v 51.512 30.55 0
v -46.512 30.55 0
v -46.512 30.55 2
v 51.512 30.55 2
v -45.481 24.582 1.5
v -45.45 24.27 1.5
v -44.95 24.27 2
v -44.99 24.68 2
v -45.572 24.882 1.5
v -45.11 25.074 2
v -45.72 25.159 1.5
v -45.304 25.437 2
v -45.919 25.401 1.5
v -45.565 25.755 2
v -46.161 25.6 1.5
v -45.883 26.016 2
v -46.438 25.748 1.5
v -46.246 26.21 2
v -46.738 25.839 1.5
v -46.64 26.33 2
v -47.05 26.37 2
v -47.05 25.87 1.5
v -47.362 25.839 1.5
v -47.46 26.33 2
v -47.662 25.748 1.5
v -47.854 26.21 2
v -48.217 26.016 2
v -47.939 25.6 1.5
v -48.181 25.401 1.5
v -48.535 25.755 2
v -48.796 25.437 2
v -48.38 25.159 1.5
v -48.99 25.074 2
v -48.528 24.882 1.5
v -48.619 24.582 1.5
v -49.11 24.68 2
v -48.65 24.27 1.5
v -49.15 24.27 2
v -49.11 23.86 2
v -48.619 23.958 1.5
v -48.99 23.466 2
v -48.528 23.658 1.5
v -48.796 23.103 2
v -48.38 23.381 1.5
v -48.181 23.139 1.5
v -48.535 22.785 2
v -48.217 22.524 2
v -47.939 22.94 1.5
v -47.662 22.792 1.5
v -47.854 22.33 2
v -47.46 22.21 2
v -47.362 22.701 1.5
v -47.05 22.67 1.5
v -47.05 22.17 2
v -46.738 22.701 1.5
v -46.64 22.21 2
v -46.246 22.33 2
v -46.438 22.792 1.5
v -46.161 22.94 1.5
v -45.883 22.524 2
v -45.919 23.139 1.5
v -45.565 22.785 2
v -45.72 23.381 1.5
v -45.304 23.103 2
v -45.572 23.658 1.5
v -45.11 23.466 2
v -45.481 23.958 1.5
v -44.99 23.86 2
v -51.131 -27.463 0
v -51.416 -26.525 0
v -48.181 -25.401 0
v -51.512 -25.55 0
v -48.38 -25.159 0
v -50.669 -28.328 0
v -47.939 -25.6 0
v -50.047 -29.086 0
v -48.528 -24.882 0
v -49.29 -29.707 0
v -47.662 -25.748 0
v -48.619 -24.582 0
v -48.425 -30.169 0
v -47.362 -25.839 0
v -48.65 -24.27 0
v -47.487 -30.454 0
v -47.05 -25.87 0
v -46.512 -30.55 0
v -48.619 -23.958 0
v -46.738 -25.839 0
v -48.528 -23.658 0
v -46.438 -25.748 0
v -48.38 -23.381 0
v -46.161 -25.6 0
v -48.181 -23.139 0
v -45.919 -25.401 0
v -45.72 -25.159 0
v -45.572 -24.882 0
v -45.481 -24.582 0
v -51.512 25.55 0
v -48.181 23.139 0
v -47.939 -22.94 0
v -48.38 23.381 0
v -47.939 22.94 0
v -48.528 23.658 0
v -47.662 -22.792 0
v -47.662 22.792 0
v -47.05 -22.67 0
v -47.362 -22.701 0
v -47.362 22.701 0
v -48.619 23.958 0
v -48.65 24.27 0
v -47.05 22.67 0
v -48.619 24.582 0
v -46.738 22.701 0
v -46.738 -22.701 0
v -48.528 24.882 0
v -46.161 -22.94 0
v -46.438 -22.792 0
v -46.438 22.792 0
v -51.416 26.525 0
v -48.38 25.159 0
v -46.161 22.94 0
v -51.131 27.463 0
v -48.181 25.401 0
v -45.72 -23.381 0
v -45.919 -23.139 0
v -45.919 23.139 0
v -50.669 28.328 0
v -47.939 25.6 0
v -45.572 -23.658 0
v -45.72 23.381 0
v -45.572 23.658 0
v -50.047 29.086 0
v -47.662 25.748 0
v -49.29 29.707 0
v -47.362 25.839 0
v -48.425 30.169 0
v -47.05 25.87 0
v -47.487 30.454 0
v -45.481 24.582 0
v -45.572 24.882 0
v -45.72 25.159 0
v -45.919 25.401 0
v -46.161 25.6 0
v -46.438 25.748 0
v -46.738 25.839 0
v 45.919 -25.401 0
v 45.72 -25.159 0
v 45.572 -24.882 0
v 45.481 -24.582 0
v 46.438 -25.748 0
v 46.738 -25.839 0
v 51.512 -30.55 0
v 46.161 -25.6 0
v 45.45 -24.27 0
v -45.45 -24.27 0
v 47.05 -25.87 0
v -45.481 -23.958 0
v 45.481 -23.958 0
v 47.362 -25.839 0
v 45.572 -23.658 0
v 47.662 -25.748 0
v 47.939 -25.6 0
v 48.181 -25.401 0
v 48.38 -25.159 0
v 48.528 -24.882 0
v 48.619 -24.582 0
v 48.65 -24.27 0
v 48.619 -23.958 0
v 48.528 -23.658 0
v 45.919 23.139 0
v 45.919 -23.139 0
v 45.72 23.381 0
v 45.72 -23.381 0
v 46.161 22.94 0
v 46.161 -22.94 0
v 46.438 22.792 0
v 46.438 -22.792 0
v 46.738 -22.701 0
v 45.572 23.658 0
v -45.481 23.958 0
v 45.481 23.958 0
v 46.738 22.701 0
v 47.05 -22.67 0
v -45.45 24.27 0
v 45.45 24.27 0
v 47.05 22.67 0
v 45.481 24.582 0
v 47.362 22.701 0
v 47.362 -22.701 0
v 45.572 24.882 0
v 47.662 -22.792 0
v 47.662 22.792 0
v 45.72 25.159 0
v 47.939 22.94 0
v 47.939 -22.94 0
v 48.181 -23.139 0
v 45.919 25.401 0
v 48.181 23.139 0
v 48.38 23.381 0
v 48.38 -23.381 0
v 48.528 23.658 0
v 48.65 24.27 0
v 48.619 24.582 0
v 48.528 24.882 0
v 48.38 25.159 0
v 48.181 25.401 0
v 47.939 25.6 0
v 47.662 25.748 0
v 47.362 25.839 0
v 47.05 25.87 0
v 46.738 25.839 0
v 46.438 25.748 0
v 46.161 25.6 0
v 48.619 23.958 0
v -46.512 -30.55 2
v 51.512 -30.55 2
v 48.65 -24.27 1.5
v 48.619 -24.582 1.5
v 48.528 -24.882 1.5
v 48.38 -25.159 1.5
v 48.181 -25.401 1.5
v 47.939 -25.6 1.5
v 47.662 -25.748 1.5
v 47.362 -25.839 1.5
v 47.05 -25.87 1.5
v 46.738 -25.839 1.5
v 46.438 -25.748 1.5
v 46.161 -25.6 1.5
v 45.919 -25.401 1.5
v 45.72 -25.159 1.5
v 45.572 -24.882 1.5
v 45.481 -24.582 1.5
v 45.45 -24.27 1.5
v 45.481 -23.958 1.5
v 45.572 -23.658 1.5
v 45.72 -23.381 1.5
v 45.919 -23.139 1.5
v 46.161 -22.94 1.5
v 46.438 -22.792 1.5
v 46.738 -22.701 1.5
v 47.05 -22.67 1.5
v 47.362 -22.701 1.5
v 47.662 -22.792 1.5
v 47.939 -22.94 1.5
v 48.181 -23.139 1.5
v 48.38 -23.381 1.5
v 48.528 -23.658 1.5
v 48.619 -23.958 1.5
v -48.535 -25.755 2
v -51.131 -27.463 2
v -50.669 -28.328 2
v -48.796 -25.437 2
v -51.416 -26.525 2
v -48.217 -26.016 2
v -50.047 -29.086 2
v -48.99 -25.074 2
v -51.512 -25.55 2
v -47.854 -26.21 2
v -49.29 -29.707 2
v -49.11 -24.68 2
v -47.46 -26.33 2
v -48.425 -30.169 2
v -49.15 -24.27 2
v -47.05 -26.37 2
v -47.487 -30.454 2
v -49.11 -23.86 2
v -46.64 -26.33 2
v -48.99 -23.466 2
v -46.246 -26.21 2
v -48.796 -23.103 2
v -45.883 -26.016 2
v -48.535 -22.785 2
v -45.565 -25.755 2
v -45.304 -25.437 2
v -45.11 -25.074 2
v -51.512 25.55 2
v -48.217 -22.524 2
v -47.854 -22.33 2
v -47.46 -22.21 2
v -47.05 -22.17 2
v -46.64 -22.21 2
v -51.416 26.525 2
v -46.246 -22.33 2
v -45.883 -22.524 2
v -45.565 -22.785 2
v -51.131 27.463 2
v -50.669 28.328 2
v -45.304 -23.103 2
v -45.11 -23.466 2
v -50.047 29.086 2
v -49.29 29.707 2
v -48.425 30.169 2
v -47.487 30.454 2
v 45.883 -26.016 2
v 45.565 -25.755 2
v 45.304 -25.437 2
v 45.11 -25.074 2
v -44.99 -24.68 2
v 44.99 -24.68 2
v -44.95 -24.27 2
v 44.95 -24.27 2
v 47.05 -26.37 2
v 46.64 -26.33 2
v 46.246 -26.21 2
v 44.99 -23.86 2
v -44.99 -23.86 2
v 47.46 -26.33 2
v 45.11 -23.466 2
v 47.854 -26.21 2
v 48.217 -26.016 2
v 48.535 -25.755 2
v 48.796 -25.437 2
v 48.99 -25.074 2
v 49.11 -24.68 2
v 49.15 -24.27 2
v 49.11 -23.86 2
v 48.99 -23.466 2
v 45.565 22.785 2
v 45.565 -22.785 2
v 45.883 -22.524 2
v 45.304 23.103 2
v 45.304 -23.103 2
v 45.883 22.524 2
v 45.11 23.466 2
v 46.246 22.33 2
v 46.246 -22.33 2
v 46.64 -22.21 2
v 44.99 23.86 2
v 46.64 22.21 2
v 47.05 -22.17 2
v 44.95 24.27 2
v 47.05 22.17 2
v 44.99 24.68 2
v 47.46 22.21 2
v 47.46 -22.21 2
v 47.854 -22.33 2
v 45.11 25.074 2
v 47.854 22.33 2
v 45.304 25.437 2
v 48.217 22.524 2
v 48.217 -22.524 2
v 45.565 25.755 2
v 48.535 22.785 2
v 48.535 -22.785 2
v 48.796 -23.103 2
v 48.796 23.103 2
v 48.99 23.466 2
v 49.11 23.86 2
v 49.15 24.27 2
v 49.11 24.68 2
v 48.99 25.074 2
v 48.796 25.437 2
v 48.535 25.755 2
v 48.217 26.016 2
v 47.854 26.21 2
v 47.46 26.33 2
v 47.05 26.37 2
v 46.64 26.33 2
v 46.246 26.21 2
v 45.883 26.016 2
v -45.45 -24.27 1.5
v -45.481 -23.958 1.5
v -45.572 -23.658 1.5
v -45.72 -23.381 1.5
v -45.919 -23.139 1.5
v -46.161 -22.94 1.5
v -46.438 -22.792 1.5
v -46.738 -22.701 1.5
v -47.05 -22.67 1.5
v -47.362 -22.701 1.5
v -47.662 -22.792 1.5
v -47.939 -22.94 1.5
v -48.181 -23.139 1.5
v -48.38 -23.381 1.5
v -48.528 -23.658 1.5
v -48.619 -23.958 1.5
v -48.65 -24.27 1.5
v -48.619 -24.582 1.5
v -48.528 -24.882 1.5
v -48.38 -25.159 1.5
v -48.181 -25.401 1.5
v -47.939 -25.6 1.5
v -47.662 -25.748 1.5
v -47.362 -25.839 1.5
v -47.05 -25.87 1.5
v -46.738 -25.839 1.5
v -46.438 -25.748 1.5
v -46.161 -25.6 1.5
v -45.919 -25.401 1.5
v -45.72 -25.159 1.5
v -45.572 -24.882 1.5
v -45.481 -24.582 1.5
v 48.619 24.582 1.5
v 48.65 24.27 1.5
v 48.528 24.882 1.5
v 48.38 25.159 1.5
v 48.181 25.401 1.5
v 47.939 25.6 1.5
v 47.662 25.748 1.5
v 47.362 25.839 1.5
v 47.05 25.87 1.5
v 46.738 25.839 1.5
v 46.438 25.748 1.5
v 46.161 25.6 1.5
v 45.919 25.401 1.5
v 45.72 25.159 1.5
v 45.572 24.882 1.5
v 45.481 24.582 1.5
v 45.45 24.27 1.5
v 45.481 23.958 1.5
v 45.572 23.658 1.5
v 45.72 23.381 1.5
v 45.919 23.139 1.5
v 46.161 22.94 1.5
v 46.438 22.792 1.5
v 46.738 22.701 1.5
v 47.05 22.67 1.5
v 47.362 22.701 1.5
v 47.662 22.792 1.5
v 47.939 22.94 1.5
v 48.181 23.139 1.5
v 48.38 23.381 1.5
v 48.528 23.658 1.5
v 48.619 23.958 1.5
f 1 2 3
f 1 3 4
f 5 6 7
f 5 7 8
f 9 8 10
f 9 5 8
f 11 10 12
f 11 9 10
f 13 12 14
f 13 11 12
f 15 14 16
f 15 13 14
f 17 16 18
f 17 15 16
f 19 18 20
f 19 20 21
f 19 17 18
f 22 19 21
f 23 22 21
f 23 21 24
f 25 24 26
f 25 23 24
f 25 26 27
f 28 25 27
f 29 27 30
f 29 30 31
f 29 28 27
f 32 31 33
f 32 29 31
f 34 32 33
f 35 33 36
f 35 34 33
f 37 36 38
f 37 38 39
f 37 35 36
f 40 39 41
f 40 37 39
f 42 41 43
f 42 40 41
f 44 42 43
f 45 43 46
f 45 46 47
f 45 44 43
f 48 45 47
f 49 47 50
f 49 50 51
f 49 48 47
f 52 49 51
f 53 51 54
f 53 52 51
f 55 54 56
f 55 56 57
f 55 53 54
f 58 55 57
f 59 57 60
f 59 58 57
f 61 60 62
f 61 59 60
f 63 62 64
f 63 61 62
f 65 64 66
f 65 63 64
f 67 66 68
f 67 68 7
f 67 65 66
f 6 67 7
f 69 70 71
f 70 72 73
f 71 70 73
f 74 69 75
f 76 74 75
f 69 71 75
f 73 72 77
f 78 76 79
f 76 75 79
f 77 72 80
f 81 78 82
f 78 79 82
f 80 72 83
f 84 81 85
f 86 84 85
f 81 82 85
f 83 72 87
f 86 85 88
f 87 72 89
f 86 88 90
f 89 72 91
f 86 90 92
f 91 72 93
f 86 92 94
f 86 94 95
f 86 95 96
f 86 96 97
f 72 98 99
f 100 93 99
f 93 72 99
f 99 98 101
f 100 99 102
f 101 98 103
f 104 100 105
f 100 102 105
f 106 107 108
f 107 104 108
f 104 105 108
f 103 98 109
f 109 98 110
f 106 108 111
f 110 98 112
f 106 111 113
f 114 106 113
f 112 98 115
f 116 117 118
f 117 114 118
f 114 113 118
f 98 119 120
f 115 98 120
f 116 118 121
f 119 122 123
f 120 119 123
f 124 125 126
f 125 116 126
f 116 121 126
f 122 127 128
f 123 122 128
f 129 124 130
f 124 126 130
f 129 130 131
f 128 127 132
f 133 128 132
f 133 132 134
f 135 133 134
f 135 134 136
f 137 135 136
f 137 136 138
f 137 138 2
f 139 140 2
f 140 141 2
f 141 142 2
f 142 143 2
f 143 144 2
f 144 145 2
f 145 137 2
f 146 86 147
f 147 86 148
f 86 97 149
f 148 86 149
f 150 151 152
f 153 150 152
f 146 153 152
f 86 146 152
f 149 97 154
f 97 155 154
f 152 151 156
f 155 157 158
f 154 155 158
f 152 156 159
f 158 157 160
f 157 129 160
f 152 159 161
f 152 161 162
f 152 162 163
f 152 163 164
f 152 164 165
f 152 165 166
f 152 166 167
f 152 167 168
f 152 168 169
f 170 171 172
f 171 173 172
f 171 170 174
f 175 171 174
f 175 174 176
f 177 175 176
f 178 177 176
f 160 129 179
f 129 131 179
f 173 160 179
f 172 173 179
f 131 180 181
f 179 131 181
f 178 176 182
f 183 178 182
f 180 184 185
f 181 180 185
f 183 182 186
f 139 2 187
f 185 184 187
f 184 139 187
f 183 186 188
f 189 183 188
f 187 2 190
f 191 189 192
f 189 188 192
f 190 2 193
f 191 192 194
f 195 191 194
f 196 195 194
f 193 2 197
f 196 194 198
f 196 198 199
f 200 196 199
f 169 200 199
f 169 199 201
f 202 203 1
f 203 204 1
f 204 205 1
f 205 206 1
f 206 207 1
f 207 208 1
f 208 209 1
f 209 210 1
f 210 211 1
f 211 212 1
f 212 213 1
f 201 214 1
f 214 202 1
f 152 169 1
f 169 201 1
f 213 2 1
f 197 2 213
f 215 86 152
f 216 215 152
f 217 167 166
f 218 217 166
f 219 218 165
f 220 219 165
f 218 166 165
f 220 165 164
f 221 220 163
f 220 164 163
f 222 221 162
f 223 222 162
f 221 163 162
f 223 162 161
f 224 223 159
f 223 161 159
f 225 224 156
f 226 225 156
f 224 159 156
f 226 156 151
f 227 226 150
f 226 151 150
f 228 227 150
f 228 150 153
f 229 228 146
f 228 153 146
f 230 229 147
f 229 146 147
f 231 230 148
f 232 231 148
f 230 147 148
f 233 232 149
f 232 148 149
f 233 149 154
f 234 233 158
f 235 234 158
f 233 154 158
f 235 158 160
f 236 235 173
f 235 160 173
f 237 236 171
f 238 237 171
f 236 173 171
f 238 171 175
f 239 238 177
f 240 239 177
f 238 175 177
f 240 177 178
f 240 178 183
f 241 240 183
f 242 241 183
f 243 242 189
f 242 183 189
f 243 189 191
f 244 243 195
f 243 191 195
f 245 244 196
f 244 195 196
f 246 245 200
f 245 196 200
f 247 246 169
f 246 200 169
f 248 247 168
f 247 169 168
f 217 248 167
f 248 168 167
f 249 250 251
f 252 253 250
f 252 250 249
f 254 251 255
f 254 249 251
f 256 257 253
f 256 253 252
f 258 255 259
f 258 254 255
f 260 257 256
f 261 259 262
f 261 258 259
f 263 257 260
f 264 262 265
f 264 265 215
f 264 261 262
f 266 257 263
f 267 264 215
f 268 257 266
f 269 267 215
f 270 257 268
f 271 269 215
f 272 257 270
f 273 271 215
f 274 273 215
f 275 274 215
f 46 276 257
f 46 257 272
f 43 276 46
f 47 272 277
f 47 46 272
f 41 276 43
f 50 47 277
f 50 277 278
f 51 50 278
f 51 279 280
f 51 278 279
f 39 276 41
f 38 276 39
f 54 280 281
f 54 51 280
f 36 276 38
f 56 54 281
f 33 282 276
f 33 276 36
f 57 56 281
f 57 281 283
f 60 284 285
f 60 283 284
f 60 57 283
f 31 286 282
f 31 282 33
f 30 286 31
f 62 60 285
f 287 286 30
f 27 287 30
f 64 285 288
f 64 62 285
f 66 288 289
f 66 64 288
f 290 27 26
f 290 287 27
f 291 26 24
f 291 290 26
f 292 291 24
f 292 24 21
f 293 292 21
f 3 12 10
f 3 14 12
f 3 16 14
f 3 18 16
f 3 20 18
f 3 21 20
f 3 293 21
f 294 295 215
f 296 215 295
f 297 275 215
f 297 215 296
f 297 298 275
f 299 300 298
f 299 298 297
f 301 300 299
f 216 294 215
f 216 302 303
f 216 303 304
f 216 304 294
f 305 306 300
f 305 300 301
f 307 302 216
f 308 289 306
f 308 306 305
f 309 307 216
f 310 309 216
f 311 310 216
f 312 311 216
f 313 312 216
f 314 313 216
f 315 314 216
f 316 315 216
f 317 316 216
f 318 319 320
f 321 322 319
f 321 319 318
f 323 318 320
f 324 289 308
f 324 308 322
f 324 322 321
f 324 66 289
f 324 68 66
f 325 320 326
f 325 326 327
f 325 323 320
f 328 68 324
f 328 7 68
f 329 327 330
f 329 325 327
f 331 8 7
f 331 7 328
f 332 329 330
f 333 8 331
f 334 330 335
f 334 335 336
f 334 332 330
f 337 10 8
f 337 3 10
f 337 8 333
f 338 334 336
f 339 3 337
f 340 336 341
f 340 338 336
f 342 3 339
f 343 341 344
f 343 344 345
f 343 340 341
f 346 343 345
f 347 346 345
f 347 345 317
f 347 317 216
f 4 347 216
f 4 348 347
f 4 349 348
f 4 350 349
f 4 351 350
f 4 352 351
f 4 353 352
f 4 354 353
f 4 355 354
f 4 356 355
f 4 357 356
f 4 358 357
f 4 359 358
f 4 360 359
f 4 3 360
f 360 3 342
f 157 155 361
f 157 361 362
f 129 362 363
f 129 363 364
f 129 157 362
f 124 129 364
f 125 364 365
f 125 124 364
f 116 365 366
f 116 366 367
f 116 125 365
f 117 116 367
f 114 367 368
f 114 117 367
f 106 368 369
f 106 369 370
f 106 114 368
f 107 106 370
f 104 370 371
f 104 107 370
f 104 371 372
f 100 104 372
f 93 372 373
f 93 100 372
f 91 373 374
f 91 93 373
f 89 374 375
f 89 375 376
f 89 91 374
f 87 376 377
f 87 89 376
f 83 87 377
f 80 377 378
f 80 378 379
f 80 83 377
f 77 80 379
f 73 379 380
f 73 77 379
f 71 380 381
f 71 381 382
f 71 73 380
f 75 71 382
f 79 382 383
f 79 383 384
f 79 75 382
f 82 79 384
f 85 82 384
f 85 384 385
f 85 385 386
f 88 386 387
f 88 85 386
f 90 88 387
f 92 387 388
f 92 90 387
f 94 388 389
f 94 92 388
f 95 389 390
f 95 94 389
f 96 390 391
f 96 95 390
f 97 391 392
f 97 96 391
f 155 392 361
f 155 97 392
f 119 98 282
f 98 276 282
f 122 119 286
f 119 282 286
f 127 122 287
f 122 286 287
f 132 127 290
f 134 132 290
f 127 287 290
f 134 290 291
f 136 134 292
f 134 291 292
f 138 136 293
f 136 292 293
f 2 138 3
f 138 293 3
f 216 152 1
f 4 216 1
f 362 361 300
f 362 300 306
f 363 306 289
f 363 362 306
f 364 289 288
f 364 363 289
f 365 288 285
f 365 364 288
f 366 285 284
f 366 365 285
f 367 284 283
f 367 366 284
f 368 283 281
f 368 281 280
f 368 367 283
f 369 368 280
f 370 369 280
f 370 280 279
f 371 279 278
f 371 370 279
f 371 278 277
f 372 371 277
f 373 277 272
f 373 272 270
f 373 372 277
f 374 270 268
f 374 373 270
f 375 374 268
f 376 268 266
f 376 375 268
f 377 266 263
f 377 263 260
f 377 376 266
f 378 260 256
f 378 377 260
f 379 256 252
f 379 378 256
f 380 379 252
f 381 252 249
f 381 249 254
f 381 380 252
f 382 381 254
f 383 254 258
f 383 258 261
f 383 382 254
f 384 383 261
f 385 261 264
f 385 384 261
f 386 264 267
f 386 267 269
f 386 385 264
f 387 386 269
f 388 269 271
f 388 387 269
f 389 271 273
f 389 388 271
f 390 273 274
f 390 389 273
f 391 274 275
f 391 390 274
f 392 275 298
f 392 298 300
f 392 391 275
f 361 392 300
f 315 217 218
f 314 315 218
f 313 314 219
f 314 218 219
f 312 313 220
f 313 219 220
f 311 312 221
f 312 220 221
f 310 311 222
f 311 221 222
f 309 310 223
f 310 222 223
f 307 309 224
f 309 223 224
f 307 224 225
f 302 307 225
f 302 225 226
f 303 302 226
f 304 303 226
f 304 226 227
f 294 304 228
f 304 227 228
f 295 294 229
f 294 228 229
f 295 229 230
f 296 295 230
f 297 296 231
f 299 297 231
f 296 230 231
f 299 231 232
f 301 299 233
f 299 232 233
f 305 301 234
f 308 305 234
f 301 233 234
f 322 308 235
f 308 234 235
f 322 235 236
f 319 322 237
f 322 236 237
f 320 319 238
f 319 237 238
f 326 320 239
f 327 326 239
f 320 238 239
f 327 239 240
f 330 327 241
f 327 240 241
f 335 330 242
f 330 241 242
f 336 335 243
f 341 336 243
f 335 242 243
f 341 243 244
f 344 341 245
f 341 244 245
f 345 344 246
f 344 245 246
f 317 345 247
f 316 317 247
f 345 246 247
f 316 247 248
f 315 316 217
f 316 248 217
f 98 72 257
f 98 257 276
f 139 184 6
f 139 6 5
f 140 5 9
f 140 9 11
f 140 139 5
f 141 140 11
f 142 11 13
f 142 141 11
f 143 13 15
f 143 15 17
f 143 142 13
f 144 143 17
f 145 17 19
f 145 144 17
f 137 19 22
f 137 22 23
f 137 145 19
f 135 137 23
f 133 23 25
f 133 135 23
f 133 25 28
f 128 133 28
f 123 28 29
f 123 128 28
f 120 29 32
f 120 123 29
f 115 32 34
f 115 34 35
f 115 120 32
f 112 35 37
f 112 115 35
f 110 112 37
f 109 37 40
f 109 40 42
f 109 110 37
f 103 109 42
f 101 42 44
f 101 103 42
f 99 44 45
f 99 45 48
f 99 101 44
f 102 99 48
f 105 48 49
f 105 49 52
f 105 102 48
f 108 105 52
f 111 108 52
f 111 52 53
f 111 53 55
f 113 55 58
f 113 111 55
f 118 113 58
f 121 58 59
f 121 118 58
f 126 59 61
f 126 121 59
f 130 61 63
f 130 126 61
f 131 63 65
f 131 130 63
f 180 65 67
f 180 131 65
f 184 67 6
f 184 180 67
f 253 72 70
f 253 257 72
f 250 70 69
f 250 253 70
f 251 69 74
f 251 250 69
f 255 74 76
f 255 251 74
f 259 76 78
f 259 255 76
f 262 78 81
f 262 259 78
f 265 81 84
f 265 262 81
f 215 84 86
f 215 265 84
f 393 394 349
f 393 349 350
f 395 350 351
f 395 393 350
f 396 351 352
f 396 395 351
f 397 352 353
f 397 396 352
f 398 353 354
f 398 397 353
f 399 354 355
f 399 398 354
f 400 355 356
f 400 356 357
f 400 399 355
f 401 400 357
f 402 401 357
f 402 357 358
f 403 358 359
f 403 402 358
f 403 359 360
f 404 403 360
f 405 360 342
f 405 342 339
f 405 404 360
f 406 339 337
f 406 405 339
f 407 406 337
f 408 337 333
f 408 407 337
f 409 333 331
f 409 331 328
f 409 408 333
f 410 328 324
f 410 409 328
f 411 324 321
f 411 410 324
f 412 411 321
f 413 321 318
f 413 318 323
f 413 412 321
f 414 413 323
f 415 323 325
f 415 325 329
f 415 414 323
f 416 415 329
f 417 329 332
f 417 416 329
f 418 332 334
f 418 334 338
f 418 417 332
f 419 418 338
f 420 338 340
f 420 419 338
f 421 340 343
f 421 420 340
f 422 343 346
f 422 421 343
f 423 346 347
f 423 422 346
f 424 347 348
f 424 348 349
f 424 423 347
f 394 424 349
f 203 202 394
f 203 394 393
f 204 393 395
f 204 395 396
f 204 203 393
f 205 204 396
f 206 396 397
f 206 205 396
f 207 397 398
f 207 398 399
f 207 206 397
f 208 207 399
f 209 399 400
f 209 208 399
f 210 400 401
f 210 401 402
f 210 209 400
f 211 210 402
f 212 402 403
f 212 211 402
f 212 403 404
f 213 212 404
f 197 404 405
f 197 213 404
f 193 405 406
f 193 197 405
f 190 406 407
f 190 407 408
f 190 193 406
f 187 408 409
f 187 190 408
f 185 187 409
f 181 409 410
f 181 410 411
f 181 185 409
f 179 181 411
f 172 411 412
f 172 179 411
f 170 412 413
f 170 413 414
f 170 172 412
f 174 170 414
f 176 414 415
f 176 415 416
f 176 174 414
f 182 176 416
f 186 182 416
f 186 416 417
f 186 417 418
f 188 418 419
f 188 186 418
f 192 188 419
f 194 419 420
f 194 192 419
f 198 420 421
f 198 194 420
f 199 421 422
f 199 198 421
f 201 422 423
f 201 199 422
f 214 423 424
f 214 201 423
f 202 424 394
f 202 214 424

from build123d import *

# Parameters (mm, degrees)
F0_W     = 103.0236035585
F0_H     = 61.1
F0_R     = 1.6
F1_DEPTH = 2
F2_R     = 5
F3_SIZE  = 0.5


with BuildPart() as f1:
    # F0 (on Top) → F1 (new body)
    with BuildSketch(Plane.XY):
        Rectangle(F0_W, F0_H)
        with Locations((-47.05, -24.27)):
            Circle(F0_R, mode=Mode.SUBTRACT)
        with BuildLine():
            ThreePointArc((45.45, -24.27), (47.05, -22.67), (48.65, -24.27))
            ThreePointArc((48.65, -24.27), (47.05, -25.87), (45.45, -24.27))
        make_face(mode=Mode.SUBTRACT)
        with Locations((-47.05, 24.27)):
            Circle(F0_R, mode=Mode.SUBTRACT)
        with Locations((47.05, 24.27)):
            Circle(F0_R, mode=Mode.SUBTRACT)
    extrude(amount=F1_DEPTH)

    # F2
    f2_edges = [f1.edges().sort_by_distance(p)[0] for p in [
        (-51.511802, -30.55, 1),
        (-51.511802, 30.55, 1),
    ]]
    fillet(f2_edges, radius=F2_R)

    # F3
    f3_edges = [f1.edges().sort_by_distance(p)[0] for p in [
        (-48.65, -24.27, 2),
        (-48.65, 24.27, 2),
        (45.45, 24.27, 2),
        (48.65, -24.27, 2),
    ]]
    chamfer(f3_edges, length=F3_SIZE)


solid = f1.part
